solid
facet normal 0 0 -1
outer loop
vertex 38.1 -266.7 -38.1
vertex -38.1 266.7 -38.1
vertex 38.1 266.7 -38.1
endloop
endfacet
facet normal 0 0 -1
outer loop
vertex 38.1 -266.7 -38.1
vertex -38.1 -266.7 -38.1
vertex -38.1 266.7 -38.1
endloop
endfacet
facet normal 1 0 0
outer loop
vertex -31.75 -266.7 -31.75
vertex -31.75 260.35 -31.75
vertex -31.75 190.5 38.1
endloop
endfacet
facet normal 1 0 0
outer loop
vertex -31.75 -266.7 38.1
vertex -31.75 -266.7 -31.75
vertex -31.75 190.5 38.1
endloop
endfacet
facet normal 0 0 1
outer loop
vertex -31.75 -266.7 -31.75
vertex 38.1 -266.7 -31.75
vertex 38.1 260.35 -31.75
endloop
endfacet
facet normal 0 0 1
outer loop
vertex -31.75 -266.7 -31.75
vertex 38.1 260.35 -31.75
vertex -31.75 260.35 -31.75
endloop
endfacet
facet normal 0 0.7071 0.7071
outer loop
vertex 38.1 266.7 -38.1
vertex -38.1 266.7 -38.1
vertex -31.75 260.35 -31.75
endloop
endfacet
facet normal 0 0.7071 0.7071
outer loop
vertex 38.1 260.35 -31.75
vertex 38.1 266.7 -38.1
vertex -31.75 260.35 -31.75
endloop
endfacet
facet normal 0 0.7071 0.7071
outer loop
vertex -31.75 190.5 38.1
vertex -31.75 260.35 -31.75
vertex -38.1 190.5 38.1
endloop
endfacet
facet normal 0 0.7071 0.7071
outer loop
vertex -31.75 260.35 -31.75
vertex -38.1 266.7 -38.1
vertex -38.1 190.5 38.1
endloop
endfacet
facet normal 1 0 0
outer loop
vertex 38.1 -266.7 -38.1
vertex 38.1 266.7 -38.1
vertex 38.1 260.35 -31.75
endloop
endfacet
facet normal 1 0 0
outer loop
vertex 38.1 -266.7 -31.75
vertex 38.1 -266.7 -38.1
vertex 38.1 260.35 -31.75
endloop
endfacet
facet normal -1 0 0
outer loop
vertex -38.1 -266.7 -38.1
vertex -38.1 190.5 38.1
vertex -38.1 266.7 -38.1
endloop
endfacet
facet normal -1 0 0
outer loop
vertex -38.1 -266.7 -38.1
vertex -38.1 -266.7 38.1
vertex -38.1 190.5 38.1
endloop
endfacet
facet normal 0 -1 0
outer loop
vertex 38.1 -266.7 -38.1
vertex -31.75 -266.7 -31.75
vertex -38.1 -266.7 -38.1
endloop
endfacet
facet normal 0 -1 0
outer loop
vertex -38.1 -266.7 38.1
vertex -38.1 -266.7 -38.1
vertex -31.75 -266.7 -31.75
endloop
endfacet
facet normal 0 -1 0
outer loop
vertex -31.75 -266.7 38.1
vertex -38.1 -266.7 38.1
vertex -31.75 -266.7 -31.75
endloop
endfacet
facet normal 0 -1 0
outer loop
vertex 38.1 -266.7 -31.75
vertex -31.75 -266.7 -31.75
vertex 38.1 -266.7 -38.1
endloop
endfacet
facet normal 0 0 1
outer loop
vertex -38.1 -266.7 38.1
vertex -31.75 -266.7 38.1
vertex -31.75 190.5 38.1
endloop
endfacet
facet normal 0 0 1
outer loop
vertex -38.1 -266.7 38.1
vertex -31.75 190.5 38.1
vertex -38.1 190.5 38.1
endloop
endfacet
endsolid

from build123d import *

# Parameters (mm, degrees)
F1_DEPTH = 266.7
F3_DEPTH = 76.2


with BuildPart() as f1:
    # F0 (on Front) → F1 (new body, symmetric)
    with BuildSketch(Plane.XZ):
        Polygon((-38.1, -38.1), (38.1, -38.1), (38.1, -31.75), (-31.75, -31.75), (-31.75, 38.1), (-38.1, 38.1), align=None)
    extrude(amount=F1_DEPTH, both=True)

    # F2 (on face) → F3 (cut)
    with BuildSketch(Plane(origin=(-38.1, 0, 0), x_dir=(0, -1, 0), z_dir=(-1, 0, 0))):
        Polygon((-266.7, 38.1), (-266.7, -38.1), (-190.5, 38.1), align=None)
    extrude(amount=-F3_DEPTH, mode=Mode.SUBTRACT)


solid = f1.part
